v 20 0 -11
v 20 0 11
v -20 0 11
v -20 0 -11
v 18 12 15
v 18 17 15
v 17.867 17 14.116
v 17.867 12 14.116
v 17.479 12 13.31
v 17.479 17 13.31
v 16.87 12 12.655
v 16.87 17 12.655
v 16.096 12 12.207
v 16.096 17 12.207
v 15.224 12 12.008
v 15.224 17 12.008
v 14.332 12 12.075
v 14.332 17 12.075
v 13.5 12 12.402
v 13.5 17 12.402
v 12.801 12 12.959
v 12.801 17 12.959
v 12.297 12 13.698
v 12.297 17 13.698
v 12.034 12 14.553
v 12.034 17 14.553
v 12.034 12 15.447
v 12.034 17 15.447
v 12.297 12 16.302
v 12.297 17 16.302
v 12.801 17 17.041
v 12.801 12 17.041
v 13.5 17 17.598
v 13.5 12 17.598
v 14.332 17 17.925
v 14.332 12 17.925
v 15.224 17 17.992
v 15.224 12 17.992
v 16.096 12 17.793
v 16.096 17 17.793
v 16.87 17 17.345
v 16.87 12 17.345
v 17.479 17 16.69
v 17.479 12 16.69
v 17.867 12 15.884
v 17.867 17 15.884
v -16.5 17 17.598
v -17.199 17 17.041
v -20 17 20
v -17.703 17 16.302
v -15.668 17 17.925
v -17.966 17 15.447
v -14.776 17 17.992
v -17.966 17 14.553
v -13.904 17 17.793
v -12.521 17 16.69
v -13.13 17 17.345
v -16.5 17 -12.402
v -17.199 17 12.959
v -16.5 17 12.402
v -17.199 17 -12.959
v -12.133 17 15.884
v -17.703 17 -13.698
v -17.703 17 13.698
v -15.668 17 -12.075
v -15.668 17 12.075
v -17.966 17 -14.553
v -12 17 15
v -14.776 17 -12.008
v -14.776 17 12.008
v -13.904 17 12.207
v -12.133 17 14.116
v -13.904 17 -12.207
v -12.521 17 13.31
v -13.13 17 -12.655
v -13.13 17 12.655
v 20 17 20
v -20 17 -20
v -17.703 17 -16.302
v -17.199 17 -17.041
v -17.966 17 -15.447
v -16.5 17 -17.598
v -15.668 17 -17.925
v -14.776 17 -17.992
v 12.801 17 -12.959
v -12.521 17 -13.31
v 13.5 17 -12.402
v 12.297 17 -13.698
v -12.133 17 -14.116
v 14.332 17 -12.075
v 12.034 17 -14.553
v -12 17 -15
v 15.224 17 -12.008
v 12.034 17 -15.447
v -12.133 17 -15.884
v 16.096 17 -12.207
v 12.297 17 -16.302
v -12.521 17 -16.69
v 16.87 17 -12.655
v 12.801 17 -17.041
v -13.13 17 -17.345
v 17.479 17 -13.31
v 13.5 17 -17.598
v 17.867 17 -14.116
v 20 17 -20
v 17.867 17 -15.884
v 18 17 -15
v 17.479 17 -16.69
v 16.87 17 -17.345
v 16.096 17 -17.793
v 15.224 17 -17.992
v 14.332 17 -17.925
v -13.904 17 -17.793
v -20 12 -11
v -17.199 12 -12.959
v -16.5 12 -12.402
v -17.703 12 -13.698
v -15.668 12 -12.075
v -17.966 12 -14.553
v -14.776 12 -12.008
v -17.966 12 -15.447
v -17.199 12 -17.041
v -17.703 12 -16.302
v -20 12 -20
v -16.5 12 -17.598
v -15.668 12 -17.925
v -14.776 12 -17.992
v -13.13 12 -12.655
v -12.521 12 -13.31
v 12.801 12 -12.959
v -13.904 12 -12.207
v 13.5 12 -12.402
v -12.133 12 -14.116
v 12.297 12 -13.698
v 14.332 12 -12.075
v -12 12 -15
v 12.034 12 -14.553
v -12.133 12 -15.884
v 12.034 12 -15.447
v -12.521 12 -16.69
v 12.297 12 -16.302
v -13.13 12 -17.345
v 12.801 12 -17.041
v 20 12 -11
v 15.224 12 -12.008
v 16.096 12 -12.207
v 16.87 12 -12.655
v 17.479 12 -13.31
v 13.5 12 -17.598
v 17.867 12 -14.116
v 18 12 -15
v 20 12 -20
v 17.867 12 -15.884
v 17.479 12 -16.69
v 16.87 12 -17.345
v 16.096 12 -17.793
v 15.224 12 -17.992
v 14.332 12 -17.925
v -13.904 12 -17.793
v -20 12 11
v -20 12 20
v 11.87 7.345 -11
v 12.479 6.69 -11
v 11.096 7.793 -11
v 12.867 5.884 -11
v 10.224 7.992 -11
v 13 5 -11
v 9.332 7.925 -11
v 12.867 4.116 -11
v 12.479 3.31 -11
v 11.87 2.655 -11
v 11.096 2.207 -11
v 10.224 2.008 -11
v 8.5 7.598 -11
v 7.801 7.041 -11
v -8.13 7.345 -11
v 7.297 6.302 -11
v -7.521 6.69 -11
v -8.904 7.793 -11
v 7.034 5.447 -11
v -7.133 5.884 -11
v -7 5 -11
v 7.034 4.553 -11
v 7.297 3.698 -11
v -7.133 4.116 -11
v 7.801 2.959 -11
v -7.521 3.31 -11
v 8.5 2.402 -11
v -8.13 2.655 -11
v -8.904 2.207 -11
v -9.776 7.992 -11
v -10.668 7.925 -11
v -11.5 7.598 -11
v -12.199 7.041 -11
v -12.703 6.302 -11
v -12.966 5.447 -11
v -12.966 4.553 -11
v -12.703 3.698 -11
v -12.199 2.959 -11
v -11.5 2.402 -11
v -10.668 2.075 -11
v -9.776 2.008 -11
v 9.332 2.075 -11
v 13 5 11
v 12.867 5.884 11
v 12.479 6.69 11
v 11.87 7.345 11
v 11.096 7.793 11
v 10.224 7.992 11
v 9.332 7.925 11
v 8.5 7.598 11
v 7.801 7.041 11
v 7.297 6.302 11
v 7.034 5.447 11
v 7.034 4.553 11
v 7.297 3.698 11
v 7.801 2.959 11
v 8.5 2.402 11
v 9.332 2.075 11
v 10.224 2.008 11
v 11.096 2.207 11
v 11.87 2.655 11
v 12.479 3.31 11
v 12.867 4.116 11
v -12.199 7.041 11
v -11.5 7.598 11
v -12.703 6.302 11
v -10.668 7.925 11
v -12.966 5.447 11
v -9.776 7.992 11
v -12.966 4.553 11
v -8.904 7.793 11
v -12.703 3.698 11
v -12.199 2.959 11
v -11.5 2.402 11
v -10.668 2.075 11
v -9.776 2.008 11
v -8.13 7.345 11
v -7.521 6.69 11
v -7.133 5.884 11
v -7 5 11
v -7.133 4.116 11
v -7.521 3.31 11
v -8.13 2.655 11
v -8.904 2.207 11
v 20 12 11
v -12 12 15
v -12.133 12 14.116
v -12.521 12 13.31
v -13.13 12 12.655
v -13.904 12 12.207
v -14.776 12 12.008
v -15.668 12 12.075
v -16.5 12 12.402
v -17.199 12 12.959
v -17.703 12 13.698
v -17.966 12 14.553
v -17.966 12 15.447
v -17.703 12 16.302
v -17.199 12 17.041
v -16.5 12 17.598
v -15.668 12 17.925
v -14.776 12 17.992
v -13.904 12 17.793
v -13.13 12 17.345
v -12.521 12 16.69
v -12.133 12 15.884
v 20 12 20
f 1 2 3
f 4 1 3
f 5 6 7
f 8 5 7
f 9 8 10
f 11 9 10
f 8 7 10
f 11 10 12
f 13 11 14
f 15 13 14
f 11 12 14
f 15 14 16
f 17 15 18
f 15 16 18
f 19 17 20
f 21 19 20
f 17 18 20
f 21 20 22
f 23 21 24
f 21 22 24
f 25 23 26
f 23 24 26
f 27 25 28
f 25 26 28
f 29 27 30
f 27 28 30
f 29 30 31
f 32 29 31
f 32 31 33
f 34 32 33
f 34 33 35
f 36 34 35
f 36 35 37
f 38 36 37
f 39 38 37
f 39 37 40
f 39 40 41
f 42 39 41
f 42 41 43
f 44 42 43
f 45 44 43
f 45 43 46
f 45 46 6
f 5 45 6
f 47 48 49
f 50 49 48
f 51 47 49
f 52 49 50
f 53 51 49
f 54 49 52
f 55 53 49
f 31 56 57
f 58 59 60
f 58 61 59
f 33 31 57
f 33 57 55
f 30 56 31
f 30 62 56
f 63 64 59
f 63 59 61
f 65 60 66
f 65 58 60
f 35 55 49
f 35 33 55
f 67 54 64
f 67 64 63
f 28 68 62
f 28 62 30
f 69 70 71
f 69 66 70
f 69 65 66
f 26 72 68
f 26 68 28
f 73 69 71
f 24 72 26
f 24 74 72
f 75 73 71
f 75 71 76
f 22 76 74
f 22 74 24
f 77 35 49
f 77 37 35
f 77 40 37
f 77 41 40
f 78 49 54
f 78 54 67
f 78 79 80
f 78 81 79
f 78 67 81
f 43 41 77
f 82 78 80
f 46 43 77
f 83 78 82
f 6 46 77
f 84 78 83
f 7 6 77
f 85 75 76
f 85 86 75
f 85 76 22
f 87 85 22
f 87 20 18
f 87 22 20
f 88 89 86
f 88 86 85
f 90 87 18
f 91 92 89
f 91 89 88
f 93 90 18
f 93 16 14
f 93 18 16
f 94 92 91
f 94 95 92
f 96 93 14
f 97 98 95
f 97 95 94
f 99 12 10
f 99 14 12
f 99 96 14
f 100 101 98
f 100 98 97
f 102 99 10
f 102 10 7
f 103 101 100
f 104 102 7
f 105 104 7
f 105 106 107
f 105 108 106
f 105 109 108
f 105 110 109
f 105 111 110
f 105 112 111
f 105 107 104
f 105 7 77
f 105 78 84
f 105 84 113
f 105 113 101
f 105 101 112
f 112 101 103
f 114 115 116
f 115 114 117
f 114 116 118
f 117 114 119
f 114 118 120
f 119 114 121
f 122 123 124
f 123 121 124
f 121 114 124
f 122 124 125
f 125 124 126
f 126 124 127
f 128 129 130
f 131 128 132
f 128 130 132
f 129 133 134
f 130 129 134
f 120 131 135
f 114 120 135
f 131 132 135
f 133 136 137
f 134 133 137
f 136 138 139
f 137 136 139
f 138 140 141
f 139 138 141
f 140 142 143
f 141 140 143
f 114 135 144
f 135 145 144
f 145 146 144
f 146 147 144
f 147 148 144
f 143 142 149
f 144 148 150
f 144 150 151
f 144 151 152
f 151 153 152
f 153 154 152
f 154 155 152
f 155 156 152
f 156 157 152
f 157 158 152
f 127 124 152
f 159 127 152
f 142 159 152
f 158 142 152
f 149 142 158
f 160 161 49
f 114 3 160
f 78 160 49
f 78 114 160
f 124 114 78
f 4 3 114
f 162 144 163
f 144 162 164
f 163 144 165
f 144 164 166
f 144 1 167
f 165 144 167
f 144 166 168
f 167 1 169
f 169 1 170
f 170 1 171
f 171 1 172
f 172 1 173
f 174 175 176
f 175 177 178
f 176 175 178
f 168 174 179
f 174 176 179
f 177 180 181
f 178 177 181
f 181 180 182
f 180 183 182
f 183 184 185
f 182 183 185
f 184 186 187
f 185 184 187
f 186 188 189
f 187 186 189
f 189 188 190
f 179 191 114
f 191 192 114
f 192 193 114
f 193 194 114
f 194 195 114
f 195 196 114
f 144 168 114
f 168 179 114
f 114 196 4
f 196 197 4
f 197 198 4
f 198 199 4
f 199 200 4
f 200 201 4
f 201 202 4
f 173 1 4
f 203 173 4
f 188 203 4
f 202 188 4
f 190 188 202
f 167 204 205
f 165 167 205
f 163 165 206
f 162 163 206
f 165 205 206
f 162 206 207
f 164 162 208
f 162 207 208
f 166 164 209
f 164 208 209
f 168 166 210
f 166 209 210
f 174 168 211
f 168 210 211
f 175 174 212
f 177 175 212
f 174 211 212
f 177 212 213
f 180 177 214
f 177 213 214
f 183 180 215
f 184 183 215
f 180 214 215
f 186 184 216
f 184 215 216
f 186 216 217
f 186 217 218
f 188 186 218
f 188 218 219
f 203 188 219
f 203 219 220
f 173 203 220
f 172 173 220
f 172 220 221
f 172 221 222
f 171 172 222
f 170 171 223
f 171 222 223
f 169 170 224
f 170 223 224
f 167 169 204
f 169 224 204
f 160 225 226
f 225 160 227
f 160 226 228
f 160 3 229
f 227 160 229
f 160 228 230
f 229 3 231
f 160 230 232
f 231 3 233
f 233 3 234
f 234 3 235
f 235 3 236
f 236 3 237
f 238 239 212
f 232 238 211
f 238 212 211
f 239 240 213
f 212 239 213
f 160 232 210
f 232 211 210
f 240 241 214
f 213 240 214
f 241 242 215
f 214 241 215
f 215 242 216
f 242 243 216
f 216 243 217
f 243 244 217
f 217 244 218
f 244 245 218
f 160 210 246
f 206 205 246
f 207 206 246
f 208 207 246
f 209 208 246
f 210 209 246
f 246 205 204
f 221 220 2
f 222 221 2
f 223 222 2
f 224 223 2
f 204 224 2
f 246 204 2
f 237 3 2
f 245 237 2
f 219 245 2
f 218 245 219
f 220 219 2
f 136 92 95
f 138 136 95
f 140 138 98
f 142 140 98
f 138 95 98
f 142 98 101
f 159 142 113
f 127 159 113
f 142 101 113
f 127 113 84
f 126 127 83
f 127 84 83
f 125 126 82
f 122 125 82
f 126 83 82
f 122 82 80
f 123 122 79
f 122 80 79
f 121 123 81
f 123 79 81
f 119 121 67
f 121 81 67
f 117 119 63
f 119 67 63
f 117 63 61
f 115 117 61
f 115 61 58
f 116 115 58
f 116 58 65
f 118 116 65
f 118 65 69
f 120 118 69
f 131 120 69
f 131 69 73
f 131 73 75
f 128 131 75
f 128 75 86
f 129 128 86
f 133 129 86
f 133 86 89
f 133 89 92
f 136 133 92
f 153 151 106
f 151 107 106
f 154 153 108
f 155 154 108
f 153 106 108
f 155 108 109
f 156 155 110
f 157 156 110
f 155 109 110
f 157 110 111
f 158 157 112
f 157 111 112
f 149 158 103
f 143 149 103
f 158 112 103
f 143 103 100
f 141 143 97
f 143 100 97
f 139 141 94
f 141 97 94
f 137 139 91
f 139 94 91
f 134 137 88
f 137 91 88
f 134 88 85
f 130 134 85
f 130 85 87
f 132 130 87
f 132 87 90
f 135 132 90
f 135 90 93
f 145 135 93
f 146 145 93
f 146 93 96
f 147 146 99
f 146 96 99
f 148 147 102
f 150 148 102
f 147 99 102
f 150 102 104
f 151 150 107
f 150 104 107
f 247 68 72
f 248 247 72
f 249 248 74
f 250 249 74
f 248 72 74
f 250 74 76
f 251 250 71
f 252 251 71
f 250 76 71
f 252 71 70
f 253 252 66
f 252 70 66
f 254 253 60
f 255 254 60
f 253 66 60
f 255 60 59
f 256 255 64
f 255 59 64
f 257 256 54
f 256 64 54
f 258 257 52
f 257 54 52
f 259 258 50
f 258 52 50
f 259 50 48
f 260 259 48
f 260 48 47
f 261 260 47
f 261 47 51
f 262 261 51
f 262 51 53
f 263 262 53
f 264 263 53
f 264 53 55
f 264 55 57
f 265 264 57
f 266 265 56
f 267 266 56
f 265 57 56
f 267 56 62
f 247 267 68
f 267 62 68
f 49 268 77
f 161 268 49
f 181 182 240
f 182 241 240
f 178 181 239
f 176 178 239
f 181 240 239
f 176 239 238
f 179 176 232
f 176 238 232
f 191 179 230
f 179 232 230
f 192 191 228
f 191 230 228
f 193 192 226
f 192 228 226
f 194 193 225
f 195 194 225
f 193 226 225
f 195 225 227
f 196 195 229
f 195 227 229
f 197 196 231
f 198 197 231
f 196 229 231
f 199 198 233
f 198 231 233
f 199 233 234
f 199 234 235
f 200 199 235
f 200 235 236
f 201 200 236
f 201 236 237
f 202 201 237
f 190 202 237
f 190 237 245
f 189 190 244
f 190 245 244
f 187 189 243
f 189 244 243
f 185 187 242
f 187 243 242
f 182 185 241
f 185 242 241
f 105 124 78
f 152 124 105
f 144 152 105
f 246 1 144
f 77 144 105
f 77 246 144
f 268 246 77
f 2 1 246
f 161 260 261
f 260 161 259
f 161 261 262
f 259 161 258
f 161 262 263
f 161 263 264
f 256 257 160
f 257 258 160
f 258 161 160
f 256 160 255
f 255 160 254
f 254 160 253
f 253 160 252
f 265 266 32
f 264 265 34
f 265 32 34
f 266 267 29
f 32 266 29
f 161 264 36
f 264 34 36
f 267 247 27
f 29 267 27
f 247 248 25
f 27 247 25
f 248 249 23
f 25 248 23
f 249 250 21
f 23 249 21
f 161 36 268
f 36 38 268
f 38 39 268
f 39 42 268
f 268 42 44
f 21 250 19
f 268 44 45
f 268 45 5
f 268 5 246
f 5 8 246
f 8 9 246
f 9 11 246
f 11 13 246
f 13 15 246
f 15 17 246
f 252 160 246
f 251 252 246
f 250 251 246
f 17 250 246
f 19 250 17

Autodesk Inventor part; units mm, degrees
ref_plane "YZ Plane" through (0, 0, 0) normal (1, 0, 0) x (0, 1, 0)
ref_plane "XZ Plane" through (0, 0, 0) normal (0, 1, 0) x (-1, 0, 0)
ref_plane "XY Plane" through (0, 0, 0) normal (0, 0, 1) x (1, 0, 0)
sketch "Sketch1" plane through (0, 0, 0) normal (0, 1, 0) x (-1, 0, 0)
  line L0 (-20, -11) -> (20, -11)
  line L1 (20, -11) -> (20, 11)
  line L2 (20, 11) -> (-20, 11)
  line L3 (-20, 11) -> (-20, -11)
  line L4 (-20, -11) -> (20, 11) construction
  line L5 (20, -11) -> (-20, 11) construction
  point P0 (0, 0)
  dimension "d0" = 22
  dimension "d1" = 40
extrude "Extrusion1" add sketch "Sketch1" along normal blind 12
sketch "Sketch2" plane through (0, 12, 0) normal (0, 1, 0) x (1, 0, 0)
  line L0 (20, -20) -> (-20, -20)
  line L1 (-20, -20) -> (-20, 20)
  line L2 (-20, 20) -> (20, 20)
  line L3 (20, 20) -> (20, -20)
  line L4 (20, -20) -> (-20, 20) construction
  line L5 (-20, -20) -> (20, 20) construction
  point P0 (0, 0)
  dimension "d4" = 40
  dimension "d5" = 40
extrude "Extrusion2" add sketch "Sketch2" along normal blind 5
sketch "Sketch3" plane through (0, 17, 0) normal (0, 1, 0) x (1, 0, 0)
  circle A0 centre (-15, -15) radius 3
  line L0 (-20, -20) -> (20, -20) projected
  line L1 (-20, 20) -> (-20, -20) projected
  circle A1 centre (15, -15) radius 3
  circle A2 centre (15, 15) radius 3
  circle A3 centre (-15, 15) radius 3
  line L2 (-20, 20) -> (20, 20) projected
  line L3 (20, -20) -> (20, 20) projected
  point P0 (0, 0)
  dimension "d8" = 6
  dimension "d9" = 5
  dimension "d10" = 5
  dimension "d11" = 6
  dimension "d12" = 6
  dimension "d13" = 6
  dimension "d14" = 5
  dimension "d15" = 5
  dimension "d16" = 5
  dimension "d17" = 5
  dimension "d18" = 5
  dimension "d19" = 5
extrude "Extrusion3" cut sketch "Sketch3" against normal blind 100 keep common part
sketch "Sketch4" plane through (-20, 0, 11) normal (0, 0, 1) x (1, 0, 0)
  circle A0 centre (10, 5) radius 3
  circle A1 centre (30, 5) radius 3
  line L0 (0, 0) -> (0, 12) projected
  line L1 (40, 0) -> (40, 12) projected
  line L2 (40, 0) -> (0, 0) projected
  point P0 (20, 0)
  dimension "d22" = 6
  dimension "d23" = 6
  dimension "d24" = 10
  dimension "d25" = 10
  dimension "d26" = 5
  dimension "d27" = 5
extrude "Extrusion4" cut sketch "Sketch4" against normal blind 100
properties part number "Conector"
